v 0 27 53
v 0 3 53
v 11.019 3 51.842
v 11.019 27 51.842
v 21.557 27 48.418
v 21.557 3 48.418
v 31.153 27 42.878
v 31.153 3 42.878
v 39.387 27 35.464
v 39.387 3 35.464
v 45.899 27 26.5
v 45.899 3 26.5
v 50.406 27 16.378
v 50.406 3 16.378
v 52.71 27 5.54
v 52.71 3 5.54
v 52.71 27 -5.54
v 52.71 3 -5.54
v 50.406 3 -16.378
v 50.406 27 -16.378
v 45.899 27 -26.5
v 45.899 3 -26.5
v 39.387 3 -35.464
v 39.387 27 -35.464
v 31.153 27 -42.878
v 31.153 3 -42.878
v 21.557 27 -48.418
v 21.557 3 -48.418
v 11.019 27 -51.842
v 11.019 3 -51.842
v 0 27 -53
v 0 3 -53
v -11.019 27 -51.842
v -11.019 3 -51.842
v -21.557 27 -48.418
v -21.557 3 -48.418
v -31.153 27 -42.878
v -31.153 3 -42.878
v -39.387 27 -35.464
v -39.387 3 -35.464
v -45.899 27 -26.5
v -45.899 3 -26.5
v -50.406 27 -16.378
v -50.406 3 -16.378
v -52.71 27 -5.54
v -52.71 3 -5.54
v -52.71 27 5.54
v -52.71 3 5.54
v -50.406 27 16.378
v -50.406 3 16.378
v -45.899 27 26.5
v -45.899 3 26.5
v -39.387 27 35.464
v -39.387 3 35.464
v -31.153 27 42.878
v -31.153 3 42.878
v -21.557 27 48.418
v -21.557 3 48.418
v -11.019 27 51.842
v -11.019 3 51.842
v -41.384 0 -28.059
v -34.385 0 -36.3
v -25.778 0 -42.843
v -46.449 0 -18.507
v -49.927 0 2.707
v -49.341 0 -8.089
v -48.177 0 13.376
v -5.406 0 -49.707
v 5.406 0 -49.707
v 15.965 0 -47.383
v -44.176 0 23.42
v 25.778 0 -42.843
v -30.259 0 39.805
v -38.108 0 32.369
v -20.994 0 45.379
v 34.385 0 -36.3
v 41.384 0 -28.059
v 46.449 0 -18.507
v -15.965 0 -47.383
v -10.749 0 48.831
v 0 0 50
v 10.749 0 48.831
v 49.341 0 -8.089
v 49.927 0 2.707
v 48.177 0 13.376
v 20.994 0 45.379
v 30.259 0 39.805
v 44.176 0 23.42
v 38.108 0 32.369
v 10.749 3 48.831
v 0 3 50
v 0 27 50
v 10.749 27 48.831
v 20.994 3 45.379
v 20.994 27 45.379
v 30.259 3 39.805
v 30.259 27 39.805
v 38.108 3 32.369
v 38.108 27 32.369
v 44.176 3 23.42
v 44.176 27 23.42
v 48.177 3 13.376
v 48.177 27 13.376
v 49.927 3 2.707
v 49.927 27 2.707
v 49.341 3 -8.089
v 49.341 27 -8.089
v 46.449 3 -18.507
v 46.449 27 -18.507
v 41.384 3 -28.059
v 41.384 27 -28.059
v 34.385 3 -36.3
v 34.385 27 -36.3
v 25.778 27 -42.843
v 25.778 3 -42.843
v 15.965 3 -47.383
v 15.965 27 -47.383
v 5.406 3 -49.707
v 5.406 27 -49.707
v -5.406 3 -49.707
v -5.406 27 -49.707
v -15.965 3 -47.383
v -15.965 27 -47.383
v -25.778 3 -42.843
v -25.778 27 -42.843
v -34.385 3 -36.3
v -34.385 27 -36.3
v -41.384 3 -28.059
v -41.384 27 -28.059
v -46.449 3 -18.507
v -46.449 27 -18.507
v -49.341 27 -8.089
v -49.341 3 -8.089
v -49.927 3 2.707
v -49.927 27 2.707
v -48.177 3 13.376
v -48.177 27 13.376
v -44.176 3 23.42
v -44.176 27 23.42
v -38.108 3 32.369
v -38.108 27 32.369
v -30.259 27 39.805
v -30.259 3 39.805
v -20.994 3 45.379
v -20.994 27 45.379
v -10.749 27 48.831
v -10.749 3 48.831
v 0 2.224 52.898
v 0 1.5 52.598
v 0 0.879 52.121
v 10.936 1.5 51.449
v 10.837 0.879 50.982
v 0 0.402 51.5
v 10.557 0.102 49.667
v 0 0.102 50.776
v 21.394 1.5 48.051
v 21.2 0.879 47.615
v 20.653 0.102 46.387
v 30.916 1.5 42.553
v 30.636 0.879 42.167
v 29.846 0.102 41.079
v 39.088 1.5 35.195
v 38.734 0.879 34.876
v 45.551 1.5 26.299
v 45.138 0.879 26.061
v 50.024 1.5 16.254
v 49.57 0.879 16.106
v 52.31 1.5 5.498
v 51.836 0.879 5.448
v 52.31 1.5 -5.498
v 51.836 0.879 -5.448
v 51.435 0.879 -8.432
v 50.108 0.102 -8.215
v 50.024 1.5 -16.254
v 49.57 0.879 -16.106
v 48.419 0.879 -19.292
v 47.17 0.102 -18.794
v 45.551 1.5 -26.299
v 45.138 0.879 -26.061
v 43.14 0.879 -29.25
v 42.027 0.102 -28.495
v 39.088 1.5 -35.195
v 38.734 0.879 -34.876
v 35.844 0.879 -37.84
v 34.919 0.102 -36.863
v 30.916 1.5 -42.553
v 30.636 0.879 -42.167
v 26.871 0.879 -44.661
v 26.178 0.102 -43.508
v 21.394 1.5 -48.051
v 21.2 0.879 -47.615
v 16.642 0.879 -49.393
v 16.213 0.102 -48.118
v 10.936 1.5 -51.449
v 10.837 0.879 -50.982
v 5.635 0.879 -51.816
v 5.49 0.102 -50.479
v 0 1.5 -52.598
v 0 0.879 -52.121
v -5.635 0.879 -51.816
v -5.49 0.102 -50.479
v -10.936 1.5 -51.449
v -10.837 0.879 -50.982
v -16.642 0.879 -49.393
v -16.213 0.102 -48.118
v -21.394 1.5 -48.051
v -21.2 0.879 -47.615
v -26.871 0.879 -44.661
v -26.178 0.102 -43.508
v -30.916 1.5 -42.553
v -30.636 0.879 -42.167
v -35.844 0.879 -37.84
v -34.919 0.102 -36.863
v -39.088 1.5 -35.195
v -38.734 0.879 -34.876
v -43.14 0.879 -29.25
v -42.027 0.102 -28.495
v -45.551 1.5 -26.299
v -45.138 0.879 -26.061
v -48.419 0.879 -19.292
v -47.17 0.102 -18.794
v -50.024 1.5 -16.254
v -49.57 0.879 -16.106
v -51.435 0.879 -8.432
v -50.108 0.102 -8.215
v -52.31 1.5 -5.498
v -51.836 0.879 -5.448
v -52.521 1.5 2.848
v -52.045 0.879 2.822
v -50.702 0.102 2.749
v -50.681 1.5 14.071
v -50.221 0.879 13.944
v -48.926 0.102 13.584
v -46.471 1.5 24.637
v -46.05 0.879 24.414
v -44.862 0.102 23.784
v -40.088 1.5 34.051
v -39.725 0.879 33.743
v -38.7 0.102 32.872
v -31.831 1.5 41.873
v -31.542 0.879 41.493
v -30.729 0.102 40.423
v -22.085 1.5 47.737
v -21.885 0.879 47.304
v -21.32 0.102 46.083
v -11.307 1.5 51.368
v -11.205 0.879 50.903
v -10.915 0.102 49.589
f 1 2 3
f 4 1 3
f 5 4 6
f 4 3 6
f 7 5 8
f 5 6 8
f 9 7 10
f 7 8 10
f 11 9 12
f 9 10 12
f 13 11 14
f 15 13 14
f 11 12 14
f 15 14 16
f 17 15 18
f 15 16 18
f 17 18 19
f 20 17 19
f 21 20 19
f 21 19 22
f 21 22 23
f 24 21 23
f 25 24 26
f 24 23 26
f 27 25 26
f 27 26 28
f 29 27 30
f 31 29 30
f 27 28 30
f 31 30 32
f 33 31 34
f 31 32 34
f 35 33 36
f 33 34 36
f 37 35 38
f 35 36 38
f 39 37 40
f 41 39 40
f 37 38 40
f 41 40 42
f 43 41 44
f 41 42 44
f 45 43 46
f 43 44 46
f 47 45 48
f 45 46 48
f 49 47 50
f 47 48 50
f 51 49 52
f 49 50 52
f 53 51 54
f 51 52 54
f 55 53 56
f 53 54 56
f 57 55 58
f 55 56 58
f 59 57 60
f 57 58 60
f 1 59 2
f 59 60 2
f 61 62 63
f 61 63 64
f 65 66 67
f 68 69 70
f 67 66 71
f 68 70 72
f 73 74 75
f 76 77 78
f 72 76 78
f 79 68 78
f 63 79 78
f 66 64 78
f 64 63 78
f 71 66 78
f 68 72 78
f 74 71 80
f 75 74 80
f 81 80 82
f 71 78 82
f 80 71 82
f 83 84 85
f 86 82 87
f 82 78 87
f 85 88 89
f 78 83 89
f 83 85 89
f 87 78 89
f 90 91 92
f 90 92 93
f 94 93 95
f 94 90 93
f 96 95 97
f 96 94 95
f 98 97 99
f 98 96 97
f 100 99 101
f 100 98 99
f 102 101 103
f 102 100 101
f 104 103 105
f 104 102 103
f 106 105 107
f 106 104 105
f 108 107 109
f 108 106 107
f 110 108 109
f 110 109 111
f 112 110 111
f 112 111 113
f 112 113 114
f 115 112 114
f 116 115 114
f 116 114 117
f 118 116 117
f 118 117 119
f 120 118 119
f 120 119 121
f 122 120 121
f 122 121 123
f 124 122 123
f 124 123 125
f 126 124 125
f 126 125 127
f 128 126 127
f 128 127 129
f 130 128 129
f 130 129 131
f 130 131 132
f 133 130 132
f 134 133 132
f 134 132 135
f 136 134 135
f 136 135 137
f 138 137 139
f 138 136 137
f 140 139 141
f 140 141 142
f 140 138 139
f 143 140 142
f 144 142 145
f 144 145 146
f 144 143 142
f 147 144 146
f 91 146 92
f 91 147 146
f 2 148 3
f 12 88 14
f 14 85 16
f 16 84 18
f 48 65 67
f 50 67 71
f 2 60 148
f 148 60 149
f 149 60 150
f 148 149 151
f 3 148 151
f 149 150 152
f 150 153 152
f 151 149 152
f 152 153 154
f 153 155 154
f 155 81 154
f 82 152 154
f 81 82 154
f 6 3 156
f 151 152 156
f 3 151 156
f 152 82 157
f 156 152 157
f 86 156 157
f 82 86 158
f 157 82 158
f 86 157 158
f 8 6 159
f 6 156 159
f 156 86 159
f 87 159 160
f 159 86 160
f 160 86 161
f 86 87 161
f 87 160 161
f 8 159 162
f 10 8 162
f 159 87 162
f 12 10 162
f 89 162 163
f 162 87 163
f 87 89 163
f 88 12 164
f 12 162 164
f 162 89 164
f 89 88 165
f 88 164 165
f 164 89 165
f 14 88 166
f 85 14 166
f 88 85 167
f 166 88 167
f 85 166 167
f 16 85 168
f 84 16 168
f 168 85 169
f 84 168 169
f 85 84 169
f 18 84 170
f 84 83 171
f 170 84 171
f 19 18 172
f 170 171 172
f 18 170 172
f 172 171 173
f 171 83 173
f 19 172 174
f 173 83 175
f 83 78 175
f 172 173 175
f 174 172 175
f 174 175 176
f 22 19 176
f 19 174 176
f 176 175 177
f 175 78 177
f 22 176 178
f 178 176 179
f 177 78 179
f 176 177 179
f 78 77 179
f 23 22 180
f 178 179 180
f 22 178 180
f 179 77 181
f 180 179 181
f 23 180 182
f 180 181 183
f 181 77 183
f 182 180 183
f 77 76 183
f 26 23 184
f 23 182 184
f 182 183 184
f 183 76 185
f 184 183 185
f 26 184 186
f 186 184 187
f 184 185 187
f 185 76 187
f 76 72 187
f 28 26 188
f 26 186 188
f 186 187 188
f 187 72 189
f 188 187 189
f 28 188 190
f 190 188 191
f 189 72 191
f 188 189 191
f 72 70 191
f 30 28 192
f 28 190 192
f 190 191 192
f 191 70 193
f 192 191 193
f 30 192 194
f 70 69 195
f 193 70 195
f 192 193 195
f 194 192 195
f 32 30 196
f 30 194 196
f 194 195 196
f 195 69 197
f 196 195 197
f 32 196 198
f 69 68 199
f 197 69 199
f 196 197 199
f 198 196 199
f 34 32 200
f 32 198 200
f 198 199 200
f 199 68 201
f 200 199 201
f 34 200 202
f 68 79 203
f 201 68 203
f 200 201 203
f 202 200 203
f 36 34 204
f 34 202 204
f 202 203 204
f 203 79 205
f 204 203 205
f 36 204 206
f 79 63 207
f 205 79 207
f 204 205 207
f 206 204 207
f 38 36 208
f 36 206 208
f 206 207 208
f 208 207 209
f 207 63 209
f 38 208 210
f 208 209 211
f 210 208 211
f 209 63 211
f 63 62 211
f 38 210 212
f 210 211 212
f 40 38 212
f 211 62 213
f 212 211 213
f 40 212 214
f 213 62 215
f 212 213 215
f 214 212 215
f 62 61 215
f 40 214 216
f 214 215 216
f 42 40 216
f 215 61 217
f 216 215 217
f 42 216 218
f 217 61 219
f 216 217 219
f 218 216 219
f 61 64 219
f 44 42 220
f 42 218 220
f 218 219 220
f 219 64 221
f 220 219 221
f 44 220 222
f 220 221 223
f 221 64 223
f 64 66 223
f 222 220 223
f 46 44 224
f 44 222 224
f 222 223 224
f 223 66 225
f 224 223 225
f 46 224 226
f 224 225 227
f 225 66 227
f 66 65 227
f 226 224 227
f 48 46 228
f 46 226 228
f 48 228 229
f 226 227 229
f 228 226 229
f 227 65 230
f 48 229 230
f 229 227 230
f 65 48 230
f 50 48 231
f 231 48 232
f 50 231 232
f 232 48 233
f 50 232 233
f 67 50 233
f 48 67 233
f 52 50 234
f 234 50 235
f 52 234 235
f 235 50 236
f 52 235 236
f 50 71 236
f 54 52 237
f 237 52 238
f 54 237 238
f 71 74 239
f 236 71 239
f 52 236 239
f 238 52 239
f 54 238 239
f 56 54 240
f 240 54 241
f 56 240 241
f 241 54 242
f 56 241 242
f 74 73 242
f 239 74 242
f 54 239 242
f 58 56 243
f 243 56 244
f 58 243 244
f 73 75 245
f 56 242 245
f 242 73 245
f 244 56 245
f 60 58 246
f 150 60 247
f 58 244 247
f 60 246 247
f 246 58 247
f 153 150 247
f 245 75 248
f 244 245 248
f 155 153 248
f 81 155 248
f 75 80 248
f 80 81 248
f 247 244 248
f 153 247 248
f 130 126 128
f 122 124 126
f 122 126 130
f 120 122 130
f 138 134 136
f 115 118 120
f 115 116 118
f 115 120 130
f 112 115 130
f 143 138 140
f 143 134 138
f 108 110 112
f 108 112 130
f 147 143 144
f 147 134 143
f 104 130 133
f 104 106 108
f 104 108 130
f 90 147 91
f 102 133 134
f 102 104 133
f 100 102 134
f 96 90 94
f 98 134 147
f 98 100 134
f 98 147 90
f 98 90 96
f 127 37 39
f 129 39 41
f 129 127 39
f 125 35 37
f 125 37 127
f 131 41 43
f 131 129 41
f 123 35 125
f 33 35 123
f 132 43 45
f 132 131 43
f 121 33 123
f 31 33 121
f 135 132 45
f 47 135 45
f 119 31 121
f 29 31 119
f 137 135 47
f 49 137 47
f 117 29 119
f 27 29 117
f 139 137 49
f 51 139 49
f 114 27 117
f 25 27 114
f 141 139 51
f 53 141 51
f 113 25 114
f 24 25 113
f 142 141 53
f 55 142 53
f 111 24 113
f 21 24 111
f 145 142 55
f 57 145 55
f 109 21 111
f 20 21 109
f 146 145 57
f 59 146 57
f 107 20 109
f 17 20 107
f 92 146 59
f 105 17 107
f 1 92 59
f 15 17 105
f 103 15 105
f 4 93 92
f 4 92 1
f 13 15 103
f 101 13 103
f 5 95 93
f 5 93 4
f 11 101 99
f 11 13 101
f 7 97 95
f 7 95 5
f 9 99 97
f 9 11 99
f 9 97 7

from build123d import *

# Parameters (mm, degrees)
SKETCH1_R           = 53
SKETCH1_R_2         = 50
BOSS_EXTRUDE1_DEPTH = 27
SKETCH1_2_R         = 53
BOSS_EXTRUDE2_DEPTH = 3
FILLET1_R           = 3


with BuildPart() as part:
    # Sketch1 → Boss-Extrude1 (new body)
    with BuildSketch(Plane(origin=(0, 0, 0), x_dir=(1, 0, 0), z_dir=(0, 1, 0))):
        Circle(SKETCH1_R)
        Circle(SKETCH1_R_2, mode=Mode.SUBTRACT)
    extrude(amount=BOSS_EXTRUDE1_DEPTH)

    # Sketch1<2> → Boss-Extrude2 (add)
    with BuildSketch(Plane(origin=(0, 0, 0), x_dir=(1, 0, 0), z_dir=(0, 1, 0))):
        Circle(SKETCH1_2_R)
    extrude(amount=BOSS_EXTRUDE2_DEPTH)

    # Fillet1
    fillet1_edges = [part.edges().sort_by_distance(p)[0] for p in [
        (-53, 0, 0),
    ]]
    fillet(fillet1_edges, radius=FILLET1_R)


solid = part.part
